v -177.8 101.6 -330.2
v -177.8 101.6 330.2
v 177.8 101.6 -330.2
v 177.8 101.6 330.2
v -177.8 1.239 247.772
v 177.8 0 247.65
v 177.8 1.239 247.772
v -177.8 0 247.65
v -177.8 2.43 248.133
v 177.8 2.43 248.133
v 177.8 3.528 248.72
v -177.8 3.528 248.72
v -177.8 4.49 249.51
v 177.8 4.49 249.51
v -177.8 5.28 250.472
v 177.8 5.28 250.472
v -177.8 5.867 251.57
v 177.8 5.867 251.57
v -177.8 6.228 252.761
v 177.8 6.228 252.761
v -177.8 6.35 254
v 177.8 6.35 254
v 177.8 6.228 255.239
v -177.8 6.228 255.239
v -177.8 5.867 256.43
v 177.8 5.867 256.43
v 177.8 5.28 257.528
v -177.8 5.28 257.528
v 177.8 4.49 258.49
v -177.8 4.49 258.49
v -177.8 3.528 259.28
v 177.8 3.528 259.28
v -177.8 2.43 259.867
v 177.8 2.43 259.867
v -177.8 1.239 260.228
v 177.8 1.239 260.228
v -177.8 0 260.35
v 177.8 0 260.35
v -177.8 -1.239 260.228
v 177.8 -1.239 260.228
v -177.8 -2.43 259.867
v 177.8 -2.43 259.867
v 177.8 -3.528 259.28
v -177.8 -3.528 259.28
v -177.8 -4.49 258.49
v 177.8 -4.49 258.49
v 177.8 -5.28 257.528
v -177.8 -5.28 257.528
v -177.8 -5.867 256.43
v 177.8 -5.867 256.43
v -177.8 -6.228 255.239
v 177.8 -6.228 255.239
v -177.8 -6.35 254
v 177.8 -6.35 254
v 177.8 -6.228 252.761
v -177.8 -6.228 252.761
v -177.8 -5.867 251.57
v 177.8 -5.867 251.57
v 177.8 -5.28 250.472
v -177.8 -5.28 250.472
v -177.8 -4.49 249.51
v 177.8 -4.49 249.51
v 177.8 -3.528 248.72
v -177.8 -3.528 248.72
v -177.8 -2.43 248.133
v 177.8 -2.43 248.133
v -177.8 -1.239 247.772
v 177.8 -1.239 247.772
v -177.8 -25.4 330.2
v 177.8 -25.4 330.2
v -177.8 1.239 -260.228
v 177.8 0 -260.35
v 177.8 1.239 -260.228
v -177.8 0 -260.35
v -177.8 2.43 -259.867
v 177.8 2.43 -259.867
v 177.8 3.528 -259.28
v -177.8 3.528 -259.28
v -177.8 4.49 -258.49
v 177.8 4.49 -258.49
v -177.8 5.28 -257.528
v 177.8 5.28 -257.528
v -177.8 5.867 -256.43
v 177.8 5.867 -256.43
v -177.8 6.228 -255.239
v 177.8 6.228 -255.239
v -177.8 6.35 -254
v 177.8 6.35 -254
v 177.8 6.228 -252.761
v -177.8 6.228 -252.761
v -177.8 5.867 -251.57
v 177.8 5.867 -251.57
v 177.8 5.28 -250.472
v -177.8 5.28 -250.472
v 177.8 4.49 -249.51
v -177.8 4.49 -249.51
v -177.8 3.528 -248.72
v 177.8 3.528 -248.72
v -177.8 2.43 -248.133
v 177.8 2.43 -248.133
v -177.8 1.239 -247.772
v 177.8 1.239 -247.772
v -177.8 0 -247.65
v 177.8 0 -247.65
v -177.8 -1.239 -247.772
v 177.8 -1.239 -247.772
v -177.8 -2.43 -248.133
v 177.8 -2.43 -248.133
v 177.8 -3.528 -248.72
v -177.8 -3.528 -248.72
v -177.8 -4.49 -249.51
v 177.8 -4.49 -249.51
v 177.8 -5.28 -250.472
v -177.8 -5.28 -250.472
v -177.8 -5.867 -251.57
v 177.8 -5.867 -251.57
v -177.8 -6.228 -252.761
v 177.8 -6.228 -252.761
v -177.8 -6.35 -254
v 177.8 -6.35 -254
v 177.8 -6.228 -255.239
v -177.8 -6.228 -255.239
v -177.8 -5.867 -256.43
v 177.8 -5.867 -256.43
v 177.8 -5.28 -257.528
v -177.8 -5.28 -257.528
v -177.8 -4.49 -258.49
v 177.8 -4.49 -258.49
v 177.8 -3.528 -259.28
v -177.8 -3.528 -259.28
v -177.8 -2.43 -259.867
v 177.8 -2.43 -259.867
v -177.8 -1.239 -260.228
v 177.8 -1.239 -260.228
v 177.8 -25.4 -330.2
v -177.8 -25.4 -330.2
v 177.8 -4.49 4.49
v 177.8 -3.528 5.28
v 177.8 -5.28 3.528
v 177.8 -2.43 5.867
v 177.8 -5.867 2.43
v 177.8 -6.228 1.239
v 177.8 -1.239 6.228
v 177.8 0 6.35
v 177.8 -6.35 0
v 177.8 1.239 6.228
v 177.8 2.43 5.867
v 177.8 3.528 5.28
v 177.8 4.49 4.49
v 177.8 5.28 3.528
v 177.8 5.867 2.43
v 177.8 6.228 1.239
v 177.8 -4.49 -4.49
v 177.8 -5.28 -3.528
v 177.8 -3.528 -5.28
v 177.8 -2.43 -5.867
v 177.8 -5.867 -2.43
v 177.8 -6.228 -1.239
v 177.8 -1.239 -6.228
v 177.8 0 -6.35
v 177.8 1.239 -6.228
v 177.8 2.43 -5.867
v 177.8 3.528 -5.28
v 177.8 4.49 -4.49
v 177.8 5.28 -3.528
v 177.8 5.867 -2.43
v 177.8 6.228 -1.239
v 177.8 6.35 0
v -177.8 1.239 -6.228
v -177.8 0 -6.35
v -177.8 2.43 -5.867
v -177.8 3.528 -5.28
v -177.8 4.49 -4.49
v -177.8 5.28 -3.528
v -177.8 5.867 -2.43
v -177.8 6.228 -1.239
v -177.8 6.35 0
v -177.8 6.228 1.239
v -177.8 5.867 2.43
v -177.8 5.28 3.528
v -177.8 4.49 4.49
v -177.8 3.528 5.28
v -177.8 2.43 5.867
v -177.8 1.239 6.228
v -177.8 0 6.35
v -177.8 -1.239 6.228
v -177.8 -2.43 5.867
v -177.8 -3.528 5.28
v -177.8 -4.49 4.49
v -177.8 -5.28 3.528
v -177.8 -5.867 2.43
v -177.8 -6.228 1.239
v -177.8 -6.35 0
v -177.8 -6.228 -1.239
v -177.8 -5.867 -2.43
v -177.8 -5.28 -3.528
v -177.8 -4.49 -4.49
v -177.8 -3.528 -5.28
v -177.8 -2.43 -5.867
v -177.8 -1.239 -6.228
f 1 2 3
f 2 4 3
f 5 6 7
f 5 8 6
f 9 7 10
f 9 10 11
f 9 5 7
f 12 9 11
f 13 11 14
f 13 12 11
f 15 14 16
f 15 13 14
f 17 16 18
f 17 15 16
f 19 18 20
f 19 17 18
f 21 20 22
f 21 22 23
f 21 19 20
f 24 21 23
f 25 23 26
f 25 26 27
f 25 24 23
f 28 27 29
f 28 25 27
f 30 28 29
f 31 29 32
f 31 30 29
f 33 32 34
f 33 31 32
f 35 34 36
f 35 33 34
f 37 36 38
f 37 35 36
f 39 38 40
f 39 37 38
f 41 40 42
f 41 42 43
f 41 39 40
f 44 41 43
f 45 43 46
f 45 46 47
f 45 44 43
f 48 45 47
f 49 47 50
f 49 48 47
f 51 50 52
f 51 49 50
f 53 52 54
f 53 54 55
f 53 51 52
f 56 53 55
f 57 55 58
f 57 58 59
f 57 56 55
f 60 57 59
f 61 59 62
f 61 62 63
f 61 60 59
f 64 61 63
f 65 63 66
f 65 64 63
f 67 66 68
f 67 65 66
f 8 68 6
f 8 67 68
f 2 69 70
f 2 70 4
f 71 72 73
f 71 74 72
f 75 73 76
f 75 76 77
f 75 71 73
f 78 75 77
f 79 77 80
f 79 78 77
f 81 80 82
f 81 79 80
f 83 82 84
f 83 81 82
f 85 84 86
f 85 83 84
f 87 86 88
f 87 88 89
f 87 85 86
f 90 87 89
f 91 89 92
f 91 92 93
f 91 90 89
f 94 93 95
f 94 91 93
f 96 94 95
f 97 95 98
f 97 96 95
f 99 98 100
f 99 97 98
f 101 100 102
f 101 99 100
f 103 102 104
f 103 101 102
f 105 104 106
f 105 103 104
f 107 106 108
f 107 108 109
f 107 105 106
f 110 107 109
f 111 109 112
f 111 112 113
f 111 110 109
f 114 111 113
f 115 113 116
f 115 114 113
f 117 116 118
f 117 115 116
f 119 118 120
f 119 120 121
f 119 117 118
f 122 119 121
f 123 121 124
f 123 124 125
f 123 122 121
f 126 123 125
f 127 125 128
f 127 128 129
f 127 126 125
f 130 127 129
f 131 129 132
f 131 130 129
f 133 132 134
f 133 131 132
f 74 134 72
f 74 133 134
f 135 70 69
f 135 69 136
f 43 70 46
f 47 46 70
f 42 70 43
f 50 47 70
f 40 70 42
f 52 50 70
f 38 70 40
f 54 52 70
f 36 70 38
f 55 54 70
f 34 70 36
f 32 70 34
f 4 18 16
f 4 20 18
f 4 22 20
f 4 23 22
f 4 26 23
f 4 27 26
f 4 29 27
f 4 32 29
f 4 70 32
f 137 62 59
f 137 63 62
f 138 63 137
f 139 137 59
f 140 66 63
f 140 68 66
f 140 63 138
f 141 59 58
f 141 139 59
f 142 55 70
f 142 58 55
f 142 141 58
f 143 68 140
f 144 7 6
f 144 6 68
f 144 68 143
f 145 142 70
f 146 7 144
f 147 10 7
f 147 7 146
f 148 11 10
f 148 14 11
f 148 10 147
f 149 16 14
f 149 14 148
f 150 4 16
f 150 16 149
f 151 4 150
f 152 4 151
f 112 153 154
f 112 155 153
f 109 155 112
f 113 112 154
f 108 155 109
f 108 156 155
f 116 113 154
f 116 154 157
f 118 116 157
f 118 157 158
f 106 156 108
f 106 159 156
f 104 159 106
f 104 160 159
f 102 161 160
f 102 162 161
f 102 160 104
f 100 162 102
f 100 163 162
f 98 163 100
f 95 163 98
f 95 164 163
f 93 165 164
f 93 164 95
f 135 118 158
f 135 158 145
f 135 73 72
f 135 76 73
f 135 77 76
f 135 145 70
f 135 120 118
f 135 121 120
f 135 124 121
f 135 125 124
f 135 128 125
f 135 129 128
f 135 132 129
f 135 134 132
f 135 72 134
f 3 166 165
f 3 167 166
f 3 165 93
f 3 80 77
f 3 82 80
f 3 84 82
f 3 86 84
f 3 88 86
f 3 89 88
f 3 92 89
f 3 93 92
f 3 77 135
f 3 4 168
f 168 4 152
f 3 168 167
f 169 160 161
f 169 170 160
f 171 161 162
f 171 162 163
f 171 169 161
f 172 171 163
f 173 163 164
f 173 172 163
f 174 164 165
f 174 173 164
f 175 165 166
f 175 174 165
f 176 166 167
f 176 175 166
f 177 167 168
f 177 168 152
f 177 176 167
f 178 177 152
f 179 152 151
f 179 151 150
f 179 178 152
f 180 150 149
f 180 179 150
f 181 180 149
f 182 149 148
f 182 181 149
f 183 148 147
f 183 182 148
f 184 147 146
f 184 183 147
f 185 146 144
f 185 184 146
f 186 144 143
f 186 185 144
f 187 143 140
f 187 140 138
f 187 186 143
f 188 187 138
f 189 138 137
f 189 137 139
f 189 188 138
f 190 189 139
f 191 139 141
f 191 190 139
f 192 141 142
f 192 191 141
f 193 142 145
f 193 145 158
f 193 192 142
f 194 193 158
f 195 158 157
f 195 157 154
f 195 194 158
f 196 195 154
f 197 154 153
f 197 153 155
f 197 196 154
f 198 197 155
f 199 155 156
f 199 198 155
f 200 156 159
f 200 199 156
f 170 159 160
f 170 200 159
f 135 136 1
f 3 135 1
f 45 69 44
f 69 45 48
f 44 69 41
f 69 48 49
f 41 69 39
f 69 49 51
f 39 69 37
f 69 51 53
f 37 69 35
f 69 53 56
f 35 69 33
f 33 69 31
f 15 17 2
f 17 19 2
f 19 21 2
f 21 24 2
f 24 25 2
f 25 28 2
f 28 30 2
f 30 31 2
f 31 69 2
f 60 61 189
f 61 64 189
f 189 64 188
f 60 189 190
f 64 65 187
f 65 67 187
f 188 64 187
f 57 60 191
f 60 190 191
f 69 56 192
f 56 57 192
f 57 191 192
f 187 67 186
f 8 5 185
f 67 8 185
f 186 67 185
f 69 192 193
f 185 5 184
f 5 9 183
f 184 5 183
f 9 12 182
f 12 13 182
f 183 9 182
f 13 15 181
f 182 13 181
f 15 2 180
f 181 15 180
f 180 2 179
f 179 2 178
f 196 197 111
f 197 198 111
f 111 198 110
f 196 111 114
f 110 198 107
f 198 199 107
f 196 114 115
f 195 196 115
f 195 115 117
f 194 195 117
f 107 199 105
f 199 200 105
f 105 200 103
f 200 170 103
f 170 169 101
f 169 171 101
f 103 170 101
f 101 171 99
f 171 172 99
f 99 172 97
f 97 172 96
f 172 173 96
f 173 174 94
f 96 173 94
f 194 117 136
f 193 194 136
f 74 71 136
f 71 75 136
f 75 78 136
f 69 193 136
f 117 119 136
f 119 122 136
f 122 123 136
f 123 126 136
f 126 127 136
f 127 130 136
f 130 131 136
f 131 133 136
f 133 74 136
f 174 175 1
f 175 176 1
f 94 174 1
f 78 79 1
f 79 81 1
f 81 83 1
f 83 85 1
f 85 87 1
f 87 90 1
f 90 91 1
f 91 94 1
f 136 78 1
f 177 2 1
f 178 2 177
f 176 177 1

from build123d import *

# Parameters (mm, degrees)
SKETCH2_W           = 660.4
SKETCH2_H           = 127
SKETCH2_R           = 6.35
BOSS_EXTRUDE1_DEPTH = 177.8


with BuildPart() as part:
    # Sketch2 → Boss-Extrude1 (new, symmetric)
    with BuildSketch(Plane(origin=(0, 0, 0), x_dir=(0, 0, -1), z_dir=(1, 0, 0))):
        with Locations((0, 38.1)):
            Rectangle(SKETCH2_W, SKETCH2_H)
        Circle(SKETCH2_R, mode=Mode.SUBTRACT)
        with Locations((-254, 0)):
            Circle(SKETCH2_R, mode=Mode.SUBTRACT)
        with Locations((254, 0)):
            Circle(SKETCH2_R, mode=Mode.SUBTRACT)
    extrude(amount=BOSS_EXTRUDE1_DEPTH, both=True)


solid = part.part
